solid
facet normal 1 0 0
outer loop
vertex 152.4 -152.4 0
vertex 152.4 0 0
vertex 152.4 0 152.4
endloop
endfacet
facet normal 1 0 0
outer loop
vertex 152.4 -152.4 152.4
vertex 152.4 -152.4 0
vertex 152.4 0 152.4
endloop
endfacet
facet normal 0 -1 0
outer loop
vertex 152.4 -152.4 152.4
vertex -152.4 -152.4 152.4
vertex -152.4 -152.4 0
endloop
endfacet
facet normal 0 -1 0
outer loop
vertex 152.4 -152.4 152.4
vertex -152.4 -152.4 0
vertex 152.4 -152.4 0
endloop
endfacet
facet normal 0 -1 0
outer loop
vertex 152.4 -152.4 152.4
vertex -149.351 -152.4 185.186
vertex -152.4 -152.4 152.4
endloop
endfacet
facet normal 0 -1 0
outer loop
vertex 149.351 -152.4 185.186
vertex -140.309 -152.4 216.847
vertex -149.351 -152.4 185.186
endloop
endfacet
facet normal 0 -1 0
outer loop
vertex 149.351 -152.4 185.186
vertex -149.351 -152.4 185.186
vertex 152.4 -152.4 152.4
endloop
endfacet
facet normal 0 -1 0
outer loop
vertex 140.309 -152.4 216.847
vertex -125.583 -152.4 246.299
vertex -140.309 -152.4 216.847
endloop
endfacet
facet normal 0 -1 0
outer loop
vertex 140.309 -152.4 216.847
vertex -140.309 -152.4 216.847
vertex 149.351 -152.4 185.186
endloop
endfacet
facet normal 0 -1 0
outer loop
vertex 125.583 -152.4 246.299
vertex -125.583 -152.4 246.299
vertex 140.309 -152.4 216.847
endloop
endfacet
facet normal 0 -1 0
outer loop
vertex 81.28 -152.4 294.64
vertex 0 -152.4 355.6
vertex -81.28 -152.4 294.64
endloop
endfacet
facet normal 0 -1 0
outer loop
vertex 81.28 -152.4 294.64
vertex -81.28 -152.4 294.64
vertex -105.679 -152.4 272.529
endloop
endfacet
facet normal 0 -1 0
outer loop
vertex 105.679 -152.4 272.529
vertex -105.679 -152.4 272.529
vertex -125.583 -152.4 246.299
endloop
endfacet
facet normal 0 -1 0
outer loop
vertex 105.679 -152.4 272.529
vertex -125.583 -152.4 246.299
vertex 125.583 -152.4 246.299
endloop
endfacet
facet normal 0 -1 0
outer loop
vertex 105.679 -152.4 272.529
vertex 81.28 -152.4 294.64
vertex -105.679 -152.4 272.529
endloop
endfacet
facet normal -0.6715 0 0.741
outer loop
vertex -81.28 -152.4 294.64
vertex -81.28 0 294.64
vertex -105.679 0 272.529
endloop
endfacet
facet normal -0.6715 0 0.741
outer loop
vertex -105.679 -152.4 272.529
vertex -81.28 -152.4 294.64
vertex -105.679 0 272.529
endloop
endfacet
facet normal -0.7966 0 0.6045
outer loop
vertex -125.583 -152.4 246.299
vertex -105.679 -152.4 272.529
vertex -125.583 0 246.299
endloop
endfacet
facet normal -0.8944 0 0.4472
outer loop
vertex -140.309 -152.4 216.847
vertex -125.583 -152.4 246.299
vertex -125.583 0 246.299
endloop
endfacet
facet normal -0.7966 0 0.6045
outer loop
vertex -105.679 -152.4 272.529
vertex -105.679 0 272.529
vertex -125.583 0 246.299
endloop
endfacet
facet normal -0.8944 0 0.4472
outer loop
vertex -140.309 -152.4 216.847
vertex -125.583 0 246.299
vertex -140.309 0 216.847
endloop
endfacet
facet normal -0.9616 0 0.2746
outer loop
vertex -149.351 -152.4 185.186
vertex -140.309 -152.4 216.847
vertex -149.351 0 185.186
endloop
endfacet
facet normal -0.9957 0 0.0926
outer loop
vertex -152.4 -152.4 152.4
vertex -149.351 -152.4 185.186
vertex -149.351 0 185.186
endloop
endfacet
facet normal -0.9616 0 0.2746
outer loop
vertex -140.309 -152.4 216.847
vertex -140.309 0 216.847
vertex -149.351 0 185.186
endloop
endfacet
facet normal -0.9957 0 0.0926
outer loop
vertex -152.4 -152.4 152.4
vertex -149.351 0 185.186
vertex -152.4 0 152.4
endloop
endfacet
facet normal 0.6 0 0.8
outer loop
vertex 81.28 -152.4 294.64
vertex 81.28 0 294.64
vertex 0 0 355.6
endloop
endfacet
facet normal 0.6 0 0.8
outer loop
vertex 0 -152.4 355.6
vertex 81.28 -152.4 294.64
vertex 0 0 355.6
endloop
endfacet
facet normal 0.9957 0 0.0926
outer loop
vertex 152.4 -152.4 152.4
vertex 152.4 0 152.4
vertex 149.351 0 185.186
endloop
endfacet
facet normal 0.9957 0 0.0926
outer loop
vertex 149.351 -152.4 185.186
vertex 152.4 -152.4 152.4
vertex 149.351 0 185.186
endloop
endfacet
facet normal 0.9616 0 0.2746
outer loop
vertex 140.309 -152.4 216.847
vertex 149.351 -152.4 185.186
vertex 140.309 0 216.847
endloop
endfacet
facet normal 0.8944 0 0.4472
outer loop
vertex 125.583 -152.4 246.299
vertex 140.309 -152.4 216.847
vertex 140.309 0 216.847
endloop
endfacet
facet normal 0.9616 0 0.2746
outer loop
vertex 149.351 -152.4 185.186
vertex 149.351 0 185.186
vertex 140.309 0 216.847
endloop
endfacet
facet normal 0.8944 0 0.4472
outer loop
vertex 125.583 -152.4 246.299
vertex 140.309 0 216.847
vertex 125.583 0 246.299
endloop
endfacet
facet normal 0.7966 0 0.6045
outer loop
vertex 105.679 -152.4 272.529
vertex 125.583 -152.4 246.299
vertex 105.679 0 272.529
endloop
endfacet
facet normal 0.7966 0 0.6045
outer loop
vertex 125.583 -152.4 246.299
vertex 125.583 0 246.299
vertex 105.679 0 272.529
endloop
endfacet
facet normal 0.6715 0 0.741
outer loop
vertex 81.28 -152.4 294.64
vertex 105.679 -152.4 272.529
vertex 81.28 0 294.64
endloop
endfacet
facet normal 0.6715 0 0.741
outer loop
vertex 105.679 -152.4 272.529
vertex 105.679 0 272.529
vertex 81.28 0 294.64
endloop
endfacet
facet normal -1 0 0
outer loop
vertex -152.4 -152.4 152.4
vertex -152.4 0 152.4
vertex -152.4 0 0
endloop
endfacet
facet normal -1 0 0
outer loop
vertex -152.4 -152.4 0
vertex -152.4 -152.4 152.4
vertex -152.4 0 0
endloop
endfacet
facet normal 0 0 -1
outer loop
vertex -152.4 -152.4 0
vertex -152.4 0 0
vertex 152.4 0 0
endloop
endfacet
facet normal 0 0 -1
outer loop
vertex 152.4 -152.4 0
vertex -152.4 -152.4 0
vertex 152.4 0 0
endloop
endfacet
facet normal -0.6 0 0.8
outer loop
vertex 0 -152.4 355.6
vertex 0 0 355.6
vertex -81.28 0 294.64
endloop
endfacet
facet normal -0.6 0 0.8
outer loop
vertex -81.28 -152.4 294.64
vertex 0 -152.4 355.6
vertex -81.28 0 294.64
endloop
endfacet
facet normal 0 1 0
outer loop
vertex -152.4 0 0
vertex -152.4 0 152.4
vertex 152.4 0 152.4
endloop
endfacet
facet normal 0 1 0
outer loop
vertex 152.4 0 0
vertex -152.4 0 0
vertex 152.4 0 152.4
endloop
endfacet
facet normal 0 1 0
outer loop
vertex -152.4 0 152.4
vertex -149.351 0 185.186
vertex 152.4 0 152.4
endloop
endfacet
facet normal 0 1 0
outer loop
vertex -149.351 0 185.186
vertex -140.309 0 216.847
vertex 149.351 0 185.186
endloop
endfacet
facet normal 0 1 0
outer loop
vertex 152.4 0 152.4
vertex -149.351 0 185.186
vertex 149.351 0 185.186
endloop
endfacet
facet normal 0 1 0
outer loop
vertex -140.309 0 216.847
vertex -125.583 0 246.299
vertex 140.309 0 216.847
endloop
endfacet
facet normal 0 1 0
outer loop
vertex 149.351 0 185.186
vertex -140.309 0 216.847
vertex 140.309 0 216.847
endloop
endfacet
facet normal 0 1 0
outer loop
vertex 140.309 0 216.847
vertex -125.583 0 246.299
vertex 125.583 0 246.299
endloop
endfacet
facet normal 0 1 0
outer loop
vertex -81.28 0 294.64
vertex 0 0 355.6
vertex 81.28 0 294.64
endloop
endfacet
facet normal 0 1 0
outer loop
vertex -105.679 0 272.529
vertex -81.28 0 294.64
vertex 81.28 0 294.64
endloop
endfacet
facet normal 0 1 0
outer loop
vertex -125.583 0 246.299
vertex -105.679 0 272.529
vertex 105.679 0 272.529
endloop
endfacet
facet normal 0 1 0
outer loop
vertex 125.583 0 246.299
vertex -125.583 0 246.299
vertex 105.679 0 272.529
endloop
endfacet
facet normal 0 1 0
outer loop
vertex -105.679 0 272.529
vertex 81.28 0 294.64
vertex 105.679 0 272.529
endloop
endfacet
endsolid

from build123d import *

# Parameters (mm, degrees)
F1_DEPTH = 152.4


with BuildPart() as f1:
    # F0 (on Front) → F1 (new body)
    with BuildSketch(Plane.XZ):
        with BuildLine():
            Line((-152.4, 152.4), (-152.4, 0))
            Line((-152.4, 0), (152.4, 0))
            Line((152.4, 0), (152.4, 152.4))
            ThreePointArc((152.4, 152.4), (133.629155, 231.914577), (81.28, 294.64))
            Line((81.28, 294.64), (0, 355.6))
            Line((0, 355.6), (-81.28, 294.64))
            ThreePointArc((-81.28, 294.64), (-133.629155, 231.914577), (-152.4, 152.4))
        make_face()
    extrude(amount=F1_DEPTH)


solid = f1.part
